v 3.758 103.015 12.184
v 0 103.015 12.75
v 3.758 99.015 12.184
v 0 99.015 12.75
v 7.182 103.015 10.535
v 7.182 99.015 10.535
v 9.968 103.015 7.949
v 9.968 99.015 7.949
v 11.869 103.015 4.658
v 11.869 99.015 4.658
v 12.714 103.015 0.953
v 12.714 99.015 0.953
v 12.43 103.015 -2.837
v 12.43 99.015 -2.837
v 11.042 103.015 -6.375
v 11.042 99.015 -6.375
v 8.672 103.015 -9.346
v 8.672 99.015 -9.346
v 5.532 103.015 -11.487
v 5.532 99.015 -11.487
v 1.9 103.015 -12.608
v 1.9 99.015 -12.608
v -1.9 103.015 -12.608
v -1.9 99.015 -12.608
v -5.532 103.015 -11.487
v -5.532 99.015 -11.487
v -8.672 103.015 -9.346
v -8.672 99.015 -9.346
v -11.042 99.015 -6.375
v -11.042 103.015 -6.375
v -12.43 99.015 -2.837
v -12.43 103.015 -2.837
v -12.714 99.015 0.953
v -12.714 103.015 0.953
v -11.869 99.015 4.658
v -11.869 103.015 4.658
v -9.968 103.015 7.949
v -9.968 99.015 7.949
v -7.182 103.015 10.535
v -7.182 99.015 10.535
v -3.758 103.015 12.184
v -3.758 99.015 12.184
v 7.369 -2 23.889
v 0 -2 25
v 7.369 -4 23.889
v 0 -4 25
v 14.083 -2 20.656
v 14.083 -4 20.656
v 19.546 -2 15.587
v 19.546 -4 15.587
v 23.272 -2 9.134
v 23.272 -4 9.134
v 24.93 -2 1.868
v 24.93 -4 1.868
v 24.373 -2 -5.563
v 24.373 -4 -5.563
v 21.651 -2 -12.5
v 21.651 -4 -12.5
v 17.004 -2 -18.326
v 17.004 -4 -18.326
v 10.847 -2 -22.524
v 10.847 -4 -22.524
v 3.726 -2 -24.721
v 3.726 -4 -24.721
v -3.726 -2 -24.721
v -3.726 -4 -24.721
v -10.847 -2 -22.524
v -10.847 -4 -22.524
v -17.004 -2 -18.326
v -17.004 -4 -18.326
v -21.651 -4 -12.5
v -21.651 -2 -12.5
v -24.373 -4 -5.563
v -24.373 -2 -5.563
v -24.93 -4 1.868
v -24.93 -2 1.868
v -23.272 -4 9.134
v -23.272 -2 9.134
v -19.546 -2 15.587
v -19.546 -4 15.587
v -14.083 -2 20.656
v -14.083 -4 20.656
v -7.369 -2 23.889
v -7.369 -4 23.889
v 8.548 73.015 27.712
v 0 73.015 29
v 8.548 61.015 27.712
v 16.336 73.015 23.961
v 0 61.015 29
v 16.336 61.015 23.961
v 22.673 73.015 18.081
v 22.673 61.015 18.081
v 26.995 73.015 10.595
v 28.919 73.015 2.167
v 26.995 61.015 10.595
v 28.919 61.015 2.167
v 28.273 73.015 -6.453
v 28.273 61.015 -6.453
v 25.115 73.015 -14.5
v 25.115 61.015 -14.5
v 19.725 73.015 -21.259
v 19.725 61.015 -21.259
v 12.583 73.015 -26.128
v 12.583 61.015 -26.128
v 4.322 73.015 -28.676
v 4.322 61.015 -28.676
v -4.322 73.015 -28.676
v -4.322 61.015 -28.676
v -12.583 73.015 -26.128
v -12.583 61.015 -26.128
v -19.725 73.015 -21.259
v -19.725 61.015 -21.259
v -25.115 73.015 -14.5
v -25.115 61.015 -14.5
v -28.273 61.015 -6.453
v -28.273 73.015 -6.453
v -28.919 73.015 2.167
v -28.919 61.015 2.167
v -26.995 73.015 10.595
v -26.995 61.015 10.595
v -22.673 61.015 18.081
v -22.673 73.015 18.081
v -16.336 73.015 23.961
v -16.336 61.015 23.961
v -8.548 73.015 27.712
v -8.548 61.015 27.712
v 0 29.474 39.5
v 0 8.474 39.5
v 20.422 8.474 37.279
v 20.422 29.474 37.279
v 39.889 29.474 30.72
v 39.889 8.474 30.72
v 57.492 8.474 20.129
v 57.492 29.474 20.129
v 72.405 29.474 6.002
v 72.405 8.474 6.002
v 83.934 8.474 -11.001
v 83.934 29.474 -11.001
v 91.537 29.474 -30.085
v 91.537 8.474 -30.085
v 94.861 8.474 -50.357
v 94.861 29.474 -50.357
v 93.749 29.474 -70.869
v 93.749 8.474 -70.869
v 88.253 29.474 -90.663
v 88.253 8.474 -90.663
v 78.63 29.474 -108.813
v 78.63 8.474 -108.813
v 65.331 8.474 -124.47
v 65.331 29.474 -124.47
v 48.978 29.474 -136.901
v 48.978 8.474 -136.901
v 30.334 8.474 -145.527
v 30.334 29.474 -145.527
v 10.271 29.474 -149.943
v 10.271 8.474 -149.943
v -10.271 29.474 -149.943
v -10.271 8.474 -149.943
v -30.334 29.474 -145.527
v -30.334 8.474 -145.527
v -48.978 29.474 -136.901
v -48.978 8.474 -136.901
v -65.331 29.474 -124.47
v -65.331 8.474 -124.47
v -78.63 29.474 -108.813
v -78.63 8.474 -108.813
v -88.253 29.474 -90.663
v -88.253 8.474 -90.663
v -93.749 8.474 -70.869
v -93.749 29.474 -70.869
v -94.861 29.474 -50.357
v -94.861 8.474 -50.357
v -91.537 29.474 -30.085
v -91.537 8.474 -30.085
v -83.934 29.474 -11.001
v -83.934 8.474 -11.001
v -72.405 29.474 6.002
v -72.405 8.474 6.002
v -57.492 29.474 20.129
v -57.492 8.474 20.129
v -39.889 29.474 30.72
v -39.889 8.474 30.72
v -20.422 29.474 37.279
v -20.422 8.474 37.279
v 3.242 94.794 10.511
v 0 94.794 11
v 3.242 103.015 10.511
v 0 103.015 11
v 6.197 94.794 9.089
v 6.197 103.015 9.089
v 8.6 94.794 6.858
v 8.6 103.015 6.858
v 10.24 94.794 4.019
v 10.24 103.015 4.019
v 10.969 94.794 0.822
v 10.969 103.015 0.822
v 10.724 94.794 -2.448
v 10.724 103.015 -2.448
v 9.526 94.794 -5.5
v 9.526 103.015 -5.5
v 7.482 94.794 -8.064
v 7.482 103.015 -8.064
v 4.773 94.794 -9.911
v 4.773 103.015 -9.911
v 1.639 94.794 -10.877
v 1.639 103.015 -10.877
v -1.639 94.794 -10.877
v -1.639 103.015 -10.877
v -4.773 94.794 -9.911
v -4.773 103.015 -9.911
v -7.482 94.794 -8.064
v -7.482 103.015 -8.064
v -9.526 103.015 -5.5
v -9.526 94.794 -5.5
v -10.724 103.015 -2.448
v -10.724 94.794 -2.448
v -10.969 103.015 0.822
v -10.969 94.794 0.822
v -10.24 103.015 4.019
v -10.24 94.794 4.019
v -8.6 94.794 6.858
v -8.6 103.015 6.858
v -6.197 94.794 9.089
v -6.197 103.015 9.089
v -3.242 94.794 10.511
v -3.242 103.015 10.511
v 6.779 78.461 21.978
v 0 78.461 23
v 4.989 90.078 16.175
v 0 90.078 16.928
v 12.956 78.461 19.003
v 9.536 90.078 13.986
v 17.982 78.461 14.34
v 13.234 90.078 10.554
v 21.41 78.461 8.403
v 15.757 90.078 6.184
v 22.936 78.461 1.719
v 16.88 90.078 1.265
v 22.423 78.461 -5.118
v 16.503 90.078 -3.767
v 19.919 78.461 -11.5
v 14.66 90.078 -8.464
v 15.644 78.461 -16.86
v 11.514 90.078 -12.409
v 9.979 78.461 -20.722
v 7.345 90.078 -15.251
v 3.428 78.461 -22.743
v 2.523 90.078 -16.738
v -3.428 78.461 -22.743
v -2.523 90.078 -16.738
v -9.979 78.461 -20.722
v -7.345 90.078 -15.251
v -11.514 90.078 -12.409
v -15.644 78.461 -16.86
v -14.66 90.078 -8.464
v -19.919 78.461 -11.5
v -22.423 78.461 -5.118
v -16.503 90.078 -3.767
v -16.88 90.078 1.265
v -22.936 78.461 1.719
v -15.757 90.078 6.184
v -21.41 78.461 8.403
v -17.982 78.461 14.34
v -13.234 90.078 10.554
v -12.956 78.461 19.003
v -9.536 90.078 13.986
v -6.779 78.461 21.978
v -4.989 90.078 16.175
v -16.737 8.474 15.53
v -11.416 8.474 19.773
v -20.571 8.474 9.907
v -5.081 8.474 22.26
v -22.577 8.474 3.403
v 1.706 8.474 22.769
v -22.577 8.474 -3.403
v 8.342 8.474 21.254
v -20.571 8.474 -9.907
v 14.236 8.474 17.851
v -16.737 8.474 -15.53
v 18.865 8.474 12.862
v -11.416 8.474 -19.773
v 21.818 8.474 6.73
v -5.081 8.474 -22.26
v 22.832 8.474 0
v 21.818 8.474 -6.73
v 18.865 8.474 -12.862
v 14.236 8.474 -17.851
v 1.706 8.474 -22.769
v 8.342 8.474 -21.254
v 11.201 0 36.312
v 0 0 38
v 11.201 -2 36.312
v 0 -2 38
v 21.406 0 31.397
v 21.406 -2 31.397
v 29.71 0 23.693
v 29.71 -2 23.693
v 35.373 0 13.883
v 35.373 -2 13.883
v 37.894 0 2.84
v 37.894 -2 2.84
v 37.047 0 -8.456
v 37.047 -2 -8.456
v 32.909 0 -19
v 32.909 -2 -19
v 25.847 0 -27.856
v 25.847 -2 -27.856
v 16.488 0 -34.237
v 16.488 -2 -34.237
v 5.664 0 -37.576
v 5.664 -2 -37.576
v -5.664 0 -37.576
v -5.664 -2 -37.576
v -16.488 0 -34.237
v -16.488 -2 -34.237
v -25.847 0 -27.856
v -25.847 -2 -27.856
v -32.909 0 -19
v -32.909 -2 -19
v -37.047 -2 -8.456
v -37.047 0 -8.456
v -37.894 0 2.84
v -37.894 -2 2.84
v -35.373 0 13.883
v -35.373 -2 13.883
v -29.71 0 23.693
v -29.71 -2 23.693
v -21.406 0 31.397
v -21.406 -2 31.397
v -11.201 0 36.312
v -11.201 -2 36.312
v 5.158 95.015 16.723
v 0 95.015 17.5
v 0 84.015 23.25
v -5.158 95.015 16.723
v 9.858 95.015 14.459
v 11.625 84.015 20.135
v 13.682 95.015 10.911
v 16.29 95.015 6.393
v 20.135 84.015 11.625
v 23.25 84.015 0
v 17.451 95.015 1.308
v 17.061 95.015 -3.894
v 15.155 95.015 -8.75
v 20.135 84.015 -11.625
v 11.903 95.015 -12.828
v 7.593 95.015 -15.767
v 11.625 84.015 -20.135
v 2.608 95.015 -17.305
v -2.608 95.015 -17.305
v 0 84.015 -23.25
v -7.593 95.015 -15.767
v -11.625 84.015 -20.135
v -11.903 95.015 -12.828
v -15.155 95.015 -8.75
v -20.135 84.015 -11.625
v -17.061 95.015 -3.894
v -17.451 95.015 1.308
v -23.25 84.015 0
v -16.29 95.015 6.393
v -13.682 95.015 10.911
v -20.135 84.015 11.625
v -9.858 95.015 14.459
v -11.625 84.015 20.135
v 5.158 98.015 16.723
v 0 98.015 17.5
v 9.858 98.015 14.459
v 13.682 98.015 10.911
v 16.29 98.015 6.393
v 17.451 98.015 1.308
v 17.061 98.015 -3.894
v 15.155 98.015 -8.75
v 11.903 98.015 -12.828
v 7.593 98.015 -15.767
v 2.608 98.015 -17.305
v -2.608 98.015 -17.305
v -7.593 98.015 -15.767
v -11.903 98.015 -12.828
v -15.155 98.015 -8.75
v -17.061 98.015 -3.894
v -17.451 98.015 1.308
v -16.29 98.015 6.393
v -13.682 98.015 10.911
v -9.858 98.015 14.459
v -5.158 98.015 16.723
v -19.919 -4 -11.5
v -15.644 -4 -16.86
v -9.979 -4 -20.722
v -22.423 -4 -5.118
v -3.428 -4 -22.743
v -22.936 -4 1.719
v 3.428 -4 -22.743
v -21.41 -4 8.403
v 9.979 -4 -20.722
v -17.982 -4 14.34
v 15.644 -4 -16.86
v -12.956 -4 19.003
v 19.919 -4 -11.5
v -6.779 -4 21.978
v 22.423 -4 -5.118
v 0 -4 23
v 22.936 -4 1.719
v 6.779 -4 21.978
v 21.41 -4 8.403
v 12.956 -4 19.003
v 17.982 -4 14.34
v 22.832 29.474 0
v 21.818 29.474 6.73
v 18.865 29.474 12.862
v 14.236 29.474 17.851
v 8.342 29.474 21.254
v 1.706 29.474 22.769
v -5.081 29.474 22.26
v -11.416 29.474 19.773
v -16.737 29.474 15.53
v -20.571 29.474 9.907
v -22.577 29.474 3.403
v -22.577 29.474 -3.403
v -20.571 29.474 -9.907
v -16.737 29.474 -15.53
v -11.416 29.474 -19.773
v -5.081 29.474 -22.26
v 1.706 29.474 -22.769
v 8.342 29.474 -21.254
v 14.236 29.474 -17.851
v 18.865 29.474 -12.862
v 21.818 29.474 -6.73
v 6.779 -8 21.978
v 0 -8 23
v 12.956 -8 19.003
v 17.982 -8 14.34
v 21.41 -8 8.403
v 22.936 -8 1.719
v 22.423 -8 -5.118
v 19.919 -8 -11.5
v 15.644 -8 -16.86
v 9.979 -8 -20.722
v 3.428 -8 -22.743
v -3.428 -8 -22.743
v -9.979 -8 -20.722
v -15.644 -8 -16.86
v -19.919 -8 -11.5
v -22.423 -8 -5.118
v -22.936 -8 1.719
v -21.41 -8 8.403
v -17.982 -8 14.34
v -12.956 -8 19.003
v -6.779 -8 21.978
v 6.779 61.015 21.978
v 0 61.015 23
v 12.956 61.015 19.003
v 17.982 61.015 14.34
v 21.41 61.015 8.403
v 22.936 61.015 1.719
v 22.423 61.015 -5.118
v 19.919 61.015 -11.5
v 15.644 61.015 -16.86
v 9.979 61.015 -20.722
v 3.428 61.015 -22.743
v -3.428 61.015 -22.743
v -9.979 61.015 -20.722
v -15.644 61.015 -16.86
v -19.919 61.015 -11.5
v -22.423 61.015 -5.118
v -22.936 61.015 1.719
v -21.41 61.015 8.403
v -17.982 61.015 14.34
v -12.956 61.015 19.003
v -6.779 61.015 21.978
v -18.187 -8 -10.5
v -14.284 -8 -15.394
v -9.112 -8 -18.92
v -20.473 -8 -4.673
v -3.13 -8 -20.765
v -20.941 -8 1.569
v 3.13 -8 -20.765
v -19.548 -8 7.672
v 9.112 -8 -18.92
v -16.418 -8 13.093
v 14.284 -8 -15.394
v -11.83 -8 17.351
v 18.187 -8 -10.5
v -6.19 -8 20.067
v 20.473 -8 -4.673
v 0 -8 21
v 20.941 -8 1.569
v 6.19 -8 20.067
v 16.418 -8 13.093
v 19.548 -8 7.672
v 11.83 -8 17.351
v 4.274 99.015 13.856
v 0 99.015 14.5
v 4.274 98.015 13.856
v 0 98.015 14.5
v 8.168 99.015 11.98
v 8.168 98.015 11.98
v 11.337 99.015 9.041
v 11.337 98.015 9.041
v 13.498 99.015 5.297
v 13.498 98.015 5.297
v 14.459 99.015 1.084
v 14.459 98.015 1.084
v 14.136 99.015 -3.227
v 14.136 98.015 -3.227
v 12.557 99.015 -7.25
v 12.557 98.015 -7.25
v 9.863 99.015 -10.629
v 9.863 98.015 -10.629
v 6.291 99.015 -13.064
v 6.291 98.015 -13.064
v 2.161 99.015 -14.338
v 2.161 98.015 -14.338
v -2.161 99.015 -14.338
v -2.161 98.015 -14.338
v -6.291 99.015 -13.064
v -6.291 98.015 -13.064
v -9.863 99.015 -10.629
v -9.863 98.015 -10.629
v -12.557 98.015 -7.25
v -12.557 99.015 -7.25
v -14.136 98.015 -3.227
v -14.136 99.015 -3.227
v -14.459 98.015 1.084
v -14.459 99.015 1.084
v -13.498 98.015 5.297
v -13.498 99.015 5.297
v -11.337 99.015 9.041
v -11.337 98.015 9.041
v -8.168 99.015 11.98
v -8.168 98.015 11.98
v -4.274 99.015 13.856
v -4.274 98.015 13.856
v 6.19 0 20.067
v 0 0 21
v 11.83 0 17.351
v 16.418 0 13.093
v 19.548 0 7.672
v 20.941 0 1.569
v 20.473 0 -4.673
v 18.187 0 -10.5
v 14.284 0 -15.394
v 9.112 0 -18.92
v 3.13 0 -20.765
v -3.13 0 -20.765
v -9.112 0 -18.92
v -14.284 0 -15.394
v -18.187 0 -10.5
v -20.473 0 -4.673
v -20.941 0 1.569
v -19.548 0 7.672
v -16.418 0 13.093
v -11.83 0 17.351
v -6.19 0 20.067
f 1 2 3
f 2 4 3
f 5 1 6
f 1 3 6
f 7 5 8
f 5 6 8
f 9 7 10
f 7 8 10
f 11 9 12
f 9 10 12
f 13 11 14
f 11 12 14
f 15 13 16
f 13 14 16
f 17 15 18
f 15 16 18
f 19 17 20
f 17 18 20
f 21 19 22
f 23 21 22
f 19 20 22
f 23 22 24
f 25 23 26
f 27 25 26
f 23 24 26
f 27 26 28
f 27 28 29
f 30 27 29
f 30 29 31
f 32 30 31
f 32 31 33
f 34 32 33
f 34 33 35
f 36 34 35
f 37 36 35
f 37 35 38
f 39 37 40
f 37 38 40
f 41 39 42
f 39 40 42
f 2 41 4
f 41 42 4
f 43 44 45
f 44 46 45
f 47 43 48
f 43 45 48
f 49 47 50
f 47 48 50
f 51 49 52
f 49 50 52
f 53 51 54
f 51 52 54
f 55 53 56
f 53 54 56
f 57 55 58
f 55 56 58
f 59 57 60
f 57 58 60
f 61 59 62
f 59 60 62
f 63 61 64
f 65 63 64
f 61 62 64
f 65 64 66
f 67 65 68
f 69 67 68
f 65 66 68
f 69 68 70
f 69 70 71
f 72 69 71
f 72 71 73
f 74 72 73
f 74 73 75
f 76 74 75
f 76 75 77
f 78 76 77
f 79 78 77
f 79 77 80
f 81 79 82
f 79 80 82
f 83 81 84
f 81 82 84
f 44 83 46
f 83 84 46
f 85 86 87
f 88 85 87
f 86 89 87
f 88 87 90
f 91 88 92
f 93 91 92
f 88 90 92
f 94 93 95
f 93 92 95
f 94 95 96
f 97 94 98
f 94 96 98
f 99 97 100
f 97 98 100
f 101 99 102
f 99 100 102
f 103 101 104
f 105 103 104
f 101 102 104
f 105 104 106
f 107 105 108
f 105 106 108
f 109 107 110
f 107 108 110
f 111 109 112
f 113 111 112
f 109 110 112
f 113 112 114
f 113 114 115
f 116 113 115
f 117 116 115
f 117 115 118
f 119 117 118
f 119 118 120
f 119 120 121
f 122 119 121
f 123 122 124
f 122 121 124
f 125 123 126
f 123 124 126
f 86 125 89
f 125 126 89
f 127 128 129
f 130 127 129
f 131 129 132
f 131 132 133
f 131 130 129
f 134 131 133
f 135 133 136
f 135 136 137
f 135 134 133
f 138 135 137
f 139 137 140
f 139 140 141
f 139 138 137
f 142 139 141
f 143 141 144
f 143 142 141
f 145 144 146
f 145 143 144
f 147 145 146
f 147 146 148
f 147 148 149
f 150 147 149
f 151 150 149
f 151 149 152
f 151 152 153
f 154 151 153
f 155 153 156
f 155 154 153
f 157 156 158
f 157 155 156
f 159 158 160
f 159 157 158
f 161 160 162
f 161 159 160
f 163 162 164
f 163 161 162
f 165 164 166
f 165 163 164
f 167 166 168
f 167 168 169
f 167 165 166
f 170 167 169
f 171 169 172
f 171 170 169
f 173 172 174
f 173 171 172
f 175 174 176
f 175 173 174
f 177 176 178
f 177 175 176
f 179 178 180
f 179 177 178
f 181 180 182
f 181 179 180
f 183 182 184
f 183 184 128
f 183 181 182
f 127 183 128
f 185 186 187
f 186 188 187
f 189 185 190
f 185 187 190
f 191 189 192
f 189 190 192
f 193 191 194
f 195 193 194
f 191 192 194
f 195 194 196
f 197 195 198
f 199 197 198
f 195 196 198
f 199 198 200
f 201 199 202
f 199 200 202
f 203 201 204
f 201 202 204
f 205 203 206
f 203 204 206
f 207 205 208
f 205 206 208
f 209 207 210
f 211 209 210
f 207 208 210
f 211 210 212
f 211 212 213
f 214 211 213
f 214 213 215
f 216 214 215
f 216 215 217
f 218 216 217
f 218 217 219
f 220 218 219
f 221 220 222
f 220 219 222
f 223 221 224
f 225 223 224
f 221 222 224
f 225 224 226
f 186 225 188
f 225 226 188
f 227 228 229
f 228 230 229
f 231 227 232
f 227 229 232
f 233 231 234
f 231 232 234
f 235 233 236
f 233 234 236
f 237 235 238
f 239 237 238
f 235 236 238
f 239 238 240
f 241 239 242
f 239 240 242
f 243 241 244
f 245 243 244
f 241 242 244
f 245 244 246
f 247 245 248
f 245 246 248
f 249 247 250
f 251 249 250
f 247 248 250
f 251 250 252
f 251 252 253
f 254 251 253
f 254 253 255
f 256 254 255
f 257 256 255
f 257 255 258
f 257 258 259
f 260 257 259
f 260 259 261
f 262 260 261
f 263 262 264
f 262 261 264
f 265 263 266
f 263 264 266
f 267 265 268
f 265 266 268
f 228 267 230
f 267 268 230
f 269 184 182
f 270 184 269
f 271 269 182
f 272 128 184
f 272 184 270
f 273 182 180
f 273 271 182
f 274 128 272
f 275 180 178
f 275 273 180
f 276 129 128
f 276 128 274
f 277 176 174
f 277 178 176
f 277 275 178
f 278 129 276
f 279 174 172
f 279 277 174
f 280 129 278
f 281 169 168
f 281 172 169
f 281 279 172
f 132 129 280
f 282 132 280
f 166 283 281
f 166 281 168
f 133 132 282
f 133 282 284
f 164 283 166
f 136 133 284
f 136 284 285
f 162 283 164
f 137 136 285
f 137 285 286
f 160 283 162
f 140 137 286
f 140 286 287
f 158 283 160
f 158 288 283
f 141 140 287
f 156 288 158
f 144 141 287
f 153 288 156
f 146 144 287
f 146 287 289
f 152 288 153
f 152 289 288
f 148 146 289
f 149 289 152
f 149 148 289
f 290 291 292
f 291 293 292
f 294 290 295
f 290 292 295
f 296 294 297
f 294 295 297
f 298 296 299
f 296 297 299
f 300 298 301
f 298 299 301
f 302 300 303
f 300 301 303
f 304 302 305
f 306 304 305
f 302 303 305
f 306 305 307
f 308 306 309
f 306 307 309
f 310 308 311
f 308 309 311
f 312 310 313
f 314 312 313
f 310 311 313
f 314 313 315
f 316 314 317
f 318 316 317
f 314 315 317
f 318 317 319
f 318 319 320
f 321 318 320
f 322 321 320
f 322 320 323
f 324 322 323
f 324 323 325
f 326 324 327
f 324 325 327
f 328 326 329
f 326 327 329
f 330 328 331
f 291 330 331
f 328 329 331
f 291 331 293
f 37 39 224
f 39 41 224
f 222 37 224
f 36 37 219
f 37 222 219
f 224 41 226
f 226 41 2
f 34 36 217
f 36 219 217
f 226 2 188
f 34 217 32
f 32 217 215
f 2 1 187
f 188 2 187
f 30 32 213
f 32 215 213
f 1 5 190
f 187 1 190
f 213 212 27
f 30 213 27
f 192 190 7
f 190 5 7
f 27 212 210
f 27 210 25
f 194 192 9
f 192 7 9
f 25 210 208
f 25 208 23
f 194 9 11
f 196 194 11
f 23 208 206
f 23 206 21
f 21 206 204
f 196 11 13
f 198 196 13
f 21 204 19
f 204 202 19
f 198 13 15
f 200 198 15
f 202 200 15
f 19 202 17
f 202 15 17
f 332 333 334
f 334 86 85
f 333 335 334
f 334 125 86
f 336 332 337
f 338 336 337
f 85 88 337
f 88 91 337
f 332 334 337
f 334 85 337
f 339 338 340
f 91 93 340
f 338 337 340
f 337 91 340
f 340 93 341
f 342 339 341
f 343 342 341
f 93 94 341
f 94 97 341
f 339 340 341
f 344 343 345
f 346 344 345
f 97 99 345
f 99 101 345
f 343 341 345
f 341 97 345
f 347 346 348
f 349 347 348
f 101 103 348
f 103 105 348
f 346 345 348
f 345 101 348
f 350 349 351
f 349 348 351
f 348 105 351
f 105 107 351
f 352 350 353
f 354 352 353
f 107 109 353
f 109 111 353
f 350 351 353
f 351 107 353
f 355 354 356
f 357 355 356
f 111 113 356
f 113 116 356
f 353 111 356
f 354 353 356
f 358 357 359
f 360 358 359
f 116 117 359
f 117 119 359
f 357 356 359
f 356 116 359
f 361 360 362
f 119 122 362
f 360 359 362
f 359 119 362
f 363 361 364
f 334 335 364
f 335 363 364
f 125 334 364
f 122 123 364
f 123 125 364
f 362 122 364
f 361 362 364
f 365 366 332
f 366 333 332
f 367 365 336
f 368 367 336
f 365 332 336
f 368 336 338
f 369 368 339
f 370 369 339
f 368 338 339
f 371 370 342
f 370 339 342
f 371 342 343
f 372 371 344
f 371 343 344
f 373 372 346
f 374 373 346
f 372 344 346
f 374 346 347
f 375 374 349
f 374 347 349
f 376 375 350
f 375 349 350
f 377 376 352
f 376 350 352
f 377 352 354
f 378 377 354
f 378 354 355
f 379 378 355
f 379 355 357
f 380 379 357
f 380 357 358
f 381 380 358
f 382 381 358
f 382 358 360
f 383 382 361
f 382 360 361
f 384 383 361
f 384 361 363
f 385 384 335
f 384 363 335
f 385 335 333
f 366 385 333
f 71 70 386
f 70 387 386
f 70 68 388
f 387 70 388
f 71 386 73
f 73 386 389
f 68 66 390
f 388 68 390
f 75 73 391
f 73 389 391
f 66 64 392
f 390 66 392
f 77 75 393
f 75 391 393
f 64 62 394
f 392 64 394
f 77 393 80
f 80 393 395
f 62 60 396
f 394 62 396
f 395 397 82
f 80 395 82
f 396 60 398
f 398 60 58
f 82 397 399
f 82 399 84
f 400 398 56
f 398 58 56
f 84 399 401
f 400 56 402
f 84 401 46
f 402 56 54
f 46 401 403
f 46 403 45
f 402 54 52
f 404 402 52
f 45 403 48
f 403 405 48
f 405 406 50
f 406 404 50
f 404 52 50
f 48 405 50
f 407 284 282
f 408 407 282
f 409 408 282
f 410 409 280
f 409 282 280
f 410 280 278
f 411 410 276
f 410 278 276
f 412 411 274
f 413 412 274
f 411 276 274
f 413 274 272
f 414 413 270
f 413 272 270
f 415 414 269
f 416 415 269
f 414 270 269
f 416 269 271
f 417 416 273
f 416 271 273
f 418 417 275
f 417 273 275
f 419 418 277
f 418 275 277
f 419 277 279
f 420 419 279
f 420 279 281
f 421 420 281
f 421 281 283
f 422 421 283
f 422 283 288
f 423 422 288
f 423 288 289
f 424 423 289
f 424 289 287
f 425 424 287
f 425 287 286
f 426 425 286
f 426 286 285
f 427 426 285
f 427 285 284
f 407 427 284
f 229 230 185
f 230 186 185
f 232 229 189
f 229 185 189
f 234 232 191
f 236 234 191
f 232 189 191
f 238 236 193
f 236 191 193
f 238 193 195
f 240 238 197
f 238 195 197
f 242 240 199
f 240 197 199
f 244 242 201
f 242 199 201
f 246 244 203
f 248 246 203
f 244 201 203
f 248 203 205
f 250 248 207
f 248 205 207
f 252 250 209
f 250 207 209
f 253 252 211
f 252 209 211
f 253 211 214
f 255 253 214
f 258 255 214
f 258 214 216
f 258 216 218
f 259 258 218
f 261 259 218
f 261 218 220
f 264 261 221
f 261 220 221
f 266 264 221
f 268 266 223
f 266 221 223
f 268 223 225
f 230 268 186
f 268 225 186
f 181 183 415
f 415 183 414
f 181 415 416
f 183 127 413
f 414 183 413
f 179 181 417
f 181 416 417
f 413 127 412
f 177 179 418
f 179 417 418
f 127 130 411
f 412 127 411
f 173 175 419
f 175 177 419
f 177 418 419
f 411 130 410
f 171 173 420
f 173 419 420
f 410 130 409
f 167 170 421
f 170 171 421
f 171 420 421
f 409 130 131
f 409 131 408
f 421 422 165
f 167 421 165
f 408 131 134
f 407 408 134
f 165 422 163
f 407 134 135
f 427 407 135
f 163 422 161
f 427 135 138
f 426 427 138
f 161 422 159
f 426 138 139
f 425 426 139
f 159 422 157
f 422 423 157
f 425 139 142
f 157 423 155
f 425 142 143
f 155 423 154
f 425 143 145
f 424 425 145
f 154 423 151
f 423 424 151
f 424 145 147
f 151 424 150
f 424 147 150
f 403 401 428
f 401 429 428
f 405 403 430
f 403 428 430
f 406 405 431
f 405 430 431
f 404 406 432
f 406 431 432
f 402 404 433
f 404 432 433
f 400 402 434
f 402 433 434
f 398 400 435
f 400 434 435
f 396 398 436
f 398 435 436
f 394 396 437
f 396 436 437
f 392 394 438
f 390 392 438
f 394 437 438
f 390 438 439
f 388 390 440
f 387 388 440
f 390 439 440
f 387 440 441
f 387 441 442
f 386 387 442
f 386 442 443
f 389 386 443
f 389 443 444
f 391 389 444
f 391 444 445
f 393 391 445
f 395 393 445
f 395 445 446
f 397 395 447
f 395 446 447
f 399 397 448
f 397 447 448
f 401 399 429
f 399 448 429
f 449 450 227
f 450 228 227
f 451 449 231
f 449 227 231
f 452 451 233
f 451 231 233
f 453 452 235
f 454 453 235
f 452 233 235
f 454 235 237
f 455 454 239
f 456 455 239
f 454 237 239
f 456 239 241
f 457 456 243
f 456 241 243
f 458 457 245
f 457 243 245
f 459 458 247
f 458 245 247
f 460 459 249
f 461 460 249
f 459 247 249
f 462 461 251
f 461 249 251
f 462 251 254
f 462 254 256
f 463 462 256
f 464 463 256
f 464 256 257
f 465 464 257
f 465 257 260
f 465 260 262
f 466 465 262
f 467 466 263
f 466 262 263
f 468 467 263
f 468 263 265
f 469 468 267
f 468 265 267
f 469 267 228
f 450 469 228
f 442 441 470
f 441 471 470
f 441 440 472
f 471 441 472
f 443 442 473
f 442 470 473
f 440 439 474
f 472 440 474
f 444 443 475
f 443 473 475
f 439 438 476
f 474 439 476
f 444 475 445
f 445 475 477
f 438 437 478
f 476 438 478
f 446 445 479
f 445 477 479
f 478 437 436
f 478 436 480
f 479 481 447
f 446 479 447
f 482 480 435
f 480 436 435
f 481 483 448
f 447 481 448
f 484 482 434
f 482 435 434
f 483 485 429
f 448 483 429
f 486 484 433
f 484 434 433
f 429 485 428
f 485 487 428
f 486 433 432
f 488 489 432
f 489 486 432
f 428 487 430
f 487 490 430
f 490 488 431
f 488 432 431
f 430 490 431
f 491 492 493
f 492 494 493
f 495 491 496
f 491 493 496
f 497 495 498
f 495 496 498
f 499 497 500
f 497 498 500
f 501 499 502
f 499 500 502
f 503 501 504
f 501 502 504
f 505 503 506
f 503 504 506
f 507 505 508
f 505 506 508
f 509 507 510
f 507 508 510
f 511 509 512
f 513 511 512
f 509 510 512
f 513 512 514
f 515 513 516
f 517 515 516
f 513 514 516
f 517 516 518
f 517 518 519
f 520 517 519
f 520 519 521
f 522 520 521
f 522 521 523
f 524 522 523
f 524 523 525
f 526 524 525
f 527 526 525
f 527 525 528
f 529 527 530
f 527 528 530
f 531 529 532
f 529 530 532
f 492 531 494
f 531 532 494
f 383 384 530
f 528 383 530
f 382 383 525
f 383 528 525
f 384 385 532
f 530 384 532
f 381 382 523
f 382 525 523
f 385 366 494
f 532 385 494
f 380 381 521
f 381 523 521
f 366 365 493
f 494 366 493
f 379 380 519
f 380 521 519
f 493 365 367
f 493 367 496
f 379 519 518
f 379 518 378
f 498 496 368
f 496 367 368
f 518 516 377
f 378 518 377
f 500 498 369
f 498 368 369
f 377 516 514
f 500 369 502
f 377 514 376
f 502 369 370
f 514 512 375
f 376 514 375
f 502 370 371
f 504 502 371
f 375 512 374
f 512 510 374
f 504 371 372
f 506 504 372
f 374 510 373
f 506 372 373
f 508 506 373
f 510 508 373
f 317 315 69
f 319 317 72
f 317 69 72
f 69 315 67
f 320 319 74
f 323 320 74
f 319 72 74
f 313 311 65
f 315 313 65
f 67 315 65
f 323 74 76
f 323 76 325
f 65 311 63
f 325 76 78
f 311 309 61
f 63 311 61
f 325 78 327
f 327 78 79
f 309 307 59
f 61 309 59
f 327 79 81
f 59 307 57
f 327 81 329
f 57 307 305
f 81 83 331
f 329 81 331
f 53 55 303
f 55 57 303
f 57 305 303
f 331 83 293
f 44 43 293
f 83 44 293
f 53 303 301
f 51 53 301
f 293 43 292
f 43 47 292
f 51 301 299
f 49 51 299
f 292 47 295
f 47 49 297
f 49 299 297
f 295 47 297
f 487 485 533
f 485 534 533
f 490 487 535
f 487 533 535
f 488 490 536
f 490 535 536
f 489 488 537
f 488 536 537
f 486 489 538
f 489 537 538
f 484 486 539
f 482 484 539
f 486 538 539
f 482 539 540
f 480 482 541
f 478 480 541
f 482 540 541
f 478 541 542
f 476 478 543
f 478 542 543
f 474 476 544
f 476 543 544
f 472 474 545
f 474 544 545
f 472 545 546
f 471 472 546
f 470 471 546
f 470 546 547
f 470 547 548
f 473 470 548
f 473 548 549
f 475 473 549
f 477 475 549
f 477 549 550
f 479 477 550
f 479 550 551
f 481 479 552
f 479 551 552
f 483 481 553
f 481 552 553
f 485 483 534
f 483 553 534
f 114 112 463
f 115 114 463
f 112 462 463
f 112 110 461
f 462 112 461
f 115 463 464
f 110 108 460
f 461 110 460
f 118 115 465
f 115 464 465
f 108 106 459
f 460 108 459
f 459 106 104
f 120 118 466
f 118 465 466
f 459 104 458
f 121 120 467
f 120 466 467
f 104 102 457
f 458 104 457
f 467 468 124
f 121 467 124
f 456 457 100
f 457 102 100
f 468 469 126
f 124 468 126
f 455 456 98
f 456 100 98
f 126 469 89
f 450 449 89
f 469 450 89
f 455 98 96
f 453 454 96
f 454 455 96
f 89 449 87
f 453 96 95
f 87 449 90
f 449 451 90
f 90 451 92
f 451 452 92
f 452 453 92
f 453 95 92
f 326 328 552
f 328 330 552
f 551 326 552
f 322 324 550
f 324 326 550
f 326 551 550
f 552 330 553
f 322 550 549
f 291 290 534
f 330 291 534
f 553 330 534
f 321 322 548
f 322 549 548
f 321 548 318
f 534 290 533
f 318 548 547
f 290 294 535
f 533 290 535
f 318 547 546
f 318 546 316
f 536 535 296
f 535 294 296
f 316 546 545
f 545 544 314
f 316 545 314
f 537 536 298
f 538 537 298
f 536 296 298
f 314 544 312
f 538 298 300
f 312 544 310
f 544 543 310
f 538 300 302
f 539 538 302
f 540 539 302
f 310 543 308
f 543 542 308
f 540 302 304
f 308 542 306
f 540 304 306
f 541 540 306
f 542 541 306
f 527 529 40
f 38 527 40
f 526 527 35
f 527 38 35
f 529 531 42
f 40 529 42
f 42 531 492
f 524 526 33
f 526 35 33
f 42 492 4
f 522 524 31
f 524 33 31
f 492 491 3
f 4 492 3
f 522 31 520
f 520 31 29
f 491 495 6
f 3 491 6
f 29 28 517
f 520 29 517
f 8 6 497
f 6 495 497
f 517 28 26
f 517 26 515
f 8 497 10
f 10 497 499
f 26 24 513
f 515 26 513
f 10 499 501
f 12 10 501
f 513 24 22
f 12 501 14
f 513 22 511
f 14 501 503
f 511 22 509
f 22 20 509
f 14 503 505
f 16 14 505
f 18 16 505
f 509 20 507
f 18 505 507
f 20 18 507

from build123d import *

# Parameters (mm, degrees)
F0_W     = 21
F0_H     = 95
F3_R     = 22.832431
F4_DEPTH = 25


with BuildPart() as f1:
    # F0 (on Right) → F1 (revolve)
    with BuildSketch(Plane.YZ):
        Polygon((-8, 21), (0, 21), (0, 38), (-2, 38), (-2, 25), (-4, 25), (-4, 23), (-8, 23), align=None)
    revolve(axis=Axis((0, -10.295414, 0), (0, 1, 0)))


with BuildPart() as f2:
    # F0 (on Right) → F2 (revolve)
    with BuildSketch(Plane.YZ):
        with Locations((18.974437, -8)):
            Rectangle(F0_W, F0_H)
    revolve(axis=Axis((0, 16.360231, -55.5), (0, 1, 0)))

    # F3 (on face) → F4 (cut)
    with BuildSketch(Plane.XZ.offset(-8.474437)):
        Circle(F3_R)
    extrude(amount=-F4_DEPTH, mode=Mode.SUBTRACT)


with BuildPart() as f5:
    # F0 (on Right) → F5 (revolve)
    with BuildSketch(Plane.YZ):
        Polygon((61.014917, 29), (61.014917, 23), (78.461014, 23), (90.077934, 16.927519), (94.793521, 11), (103.014917, 11), (103.014917, 12.75), (99.014917, 12.75), (99.014917, 14.5), (98.014917, 14.5), (98.014917, 17.5), (95.014917, 17.5), (73.014917, 29), align=None)
    revolve(axis=Axis((0, -10.295414, 0), (0, 1, 0)))


solid = Compound([f1.part, f2.part, f5.part])
